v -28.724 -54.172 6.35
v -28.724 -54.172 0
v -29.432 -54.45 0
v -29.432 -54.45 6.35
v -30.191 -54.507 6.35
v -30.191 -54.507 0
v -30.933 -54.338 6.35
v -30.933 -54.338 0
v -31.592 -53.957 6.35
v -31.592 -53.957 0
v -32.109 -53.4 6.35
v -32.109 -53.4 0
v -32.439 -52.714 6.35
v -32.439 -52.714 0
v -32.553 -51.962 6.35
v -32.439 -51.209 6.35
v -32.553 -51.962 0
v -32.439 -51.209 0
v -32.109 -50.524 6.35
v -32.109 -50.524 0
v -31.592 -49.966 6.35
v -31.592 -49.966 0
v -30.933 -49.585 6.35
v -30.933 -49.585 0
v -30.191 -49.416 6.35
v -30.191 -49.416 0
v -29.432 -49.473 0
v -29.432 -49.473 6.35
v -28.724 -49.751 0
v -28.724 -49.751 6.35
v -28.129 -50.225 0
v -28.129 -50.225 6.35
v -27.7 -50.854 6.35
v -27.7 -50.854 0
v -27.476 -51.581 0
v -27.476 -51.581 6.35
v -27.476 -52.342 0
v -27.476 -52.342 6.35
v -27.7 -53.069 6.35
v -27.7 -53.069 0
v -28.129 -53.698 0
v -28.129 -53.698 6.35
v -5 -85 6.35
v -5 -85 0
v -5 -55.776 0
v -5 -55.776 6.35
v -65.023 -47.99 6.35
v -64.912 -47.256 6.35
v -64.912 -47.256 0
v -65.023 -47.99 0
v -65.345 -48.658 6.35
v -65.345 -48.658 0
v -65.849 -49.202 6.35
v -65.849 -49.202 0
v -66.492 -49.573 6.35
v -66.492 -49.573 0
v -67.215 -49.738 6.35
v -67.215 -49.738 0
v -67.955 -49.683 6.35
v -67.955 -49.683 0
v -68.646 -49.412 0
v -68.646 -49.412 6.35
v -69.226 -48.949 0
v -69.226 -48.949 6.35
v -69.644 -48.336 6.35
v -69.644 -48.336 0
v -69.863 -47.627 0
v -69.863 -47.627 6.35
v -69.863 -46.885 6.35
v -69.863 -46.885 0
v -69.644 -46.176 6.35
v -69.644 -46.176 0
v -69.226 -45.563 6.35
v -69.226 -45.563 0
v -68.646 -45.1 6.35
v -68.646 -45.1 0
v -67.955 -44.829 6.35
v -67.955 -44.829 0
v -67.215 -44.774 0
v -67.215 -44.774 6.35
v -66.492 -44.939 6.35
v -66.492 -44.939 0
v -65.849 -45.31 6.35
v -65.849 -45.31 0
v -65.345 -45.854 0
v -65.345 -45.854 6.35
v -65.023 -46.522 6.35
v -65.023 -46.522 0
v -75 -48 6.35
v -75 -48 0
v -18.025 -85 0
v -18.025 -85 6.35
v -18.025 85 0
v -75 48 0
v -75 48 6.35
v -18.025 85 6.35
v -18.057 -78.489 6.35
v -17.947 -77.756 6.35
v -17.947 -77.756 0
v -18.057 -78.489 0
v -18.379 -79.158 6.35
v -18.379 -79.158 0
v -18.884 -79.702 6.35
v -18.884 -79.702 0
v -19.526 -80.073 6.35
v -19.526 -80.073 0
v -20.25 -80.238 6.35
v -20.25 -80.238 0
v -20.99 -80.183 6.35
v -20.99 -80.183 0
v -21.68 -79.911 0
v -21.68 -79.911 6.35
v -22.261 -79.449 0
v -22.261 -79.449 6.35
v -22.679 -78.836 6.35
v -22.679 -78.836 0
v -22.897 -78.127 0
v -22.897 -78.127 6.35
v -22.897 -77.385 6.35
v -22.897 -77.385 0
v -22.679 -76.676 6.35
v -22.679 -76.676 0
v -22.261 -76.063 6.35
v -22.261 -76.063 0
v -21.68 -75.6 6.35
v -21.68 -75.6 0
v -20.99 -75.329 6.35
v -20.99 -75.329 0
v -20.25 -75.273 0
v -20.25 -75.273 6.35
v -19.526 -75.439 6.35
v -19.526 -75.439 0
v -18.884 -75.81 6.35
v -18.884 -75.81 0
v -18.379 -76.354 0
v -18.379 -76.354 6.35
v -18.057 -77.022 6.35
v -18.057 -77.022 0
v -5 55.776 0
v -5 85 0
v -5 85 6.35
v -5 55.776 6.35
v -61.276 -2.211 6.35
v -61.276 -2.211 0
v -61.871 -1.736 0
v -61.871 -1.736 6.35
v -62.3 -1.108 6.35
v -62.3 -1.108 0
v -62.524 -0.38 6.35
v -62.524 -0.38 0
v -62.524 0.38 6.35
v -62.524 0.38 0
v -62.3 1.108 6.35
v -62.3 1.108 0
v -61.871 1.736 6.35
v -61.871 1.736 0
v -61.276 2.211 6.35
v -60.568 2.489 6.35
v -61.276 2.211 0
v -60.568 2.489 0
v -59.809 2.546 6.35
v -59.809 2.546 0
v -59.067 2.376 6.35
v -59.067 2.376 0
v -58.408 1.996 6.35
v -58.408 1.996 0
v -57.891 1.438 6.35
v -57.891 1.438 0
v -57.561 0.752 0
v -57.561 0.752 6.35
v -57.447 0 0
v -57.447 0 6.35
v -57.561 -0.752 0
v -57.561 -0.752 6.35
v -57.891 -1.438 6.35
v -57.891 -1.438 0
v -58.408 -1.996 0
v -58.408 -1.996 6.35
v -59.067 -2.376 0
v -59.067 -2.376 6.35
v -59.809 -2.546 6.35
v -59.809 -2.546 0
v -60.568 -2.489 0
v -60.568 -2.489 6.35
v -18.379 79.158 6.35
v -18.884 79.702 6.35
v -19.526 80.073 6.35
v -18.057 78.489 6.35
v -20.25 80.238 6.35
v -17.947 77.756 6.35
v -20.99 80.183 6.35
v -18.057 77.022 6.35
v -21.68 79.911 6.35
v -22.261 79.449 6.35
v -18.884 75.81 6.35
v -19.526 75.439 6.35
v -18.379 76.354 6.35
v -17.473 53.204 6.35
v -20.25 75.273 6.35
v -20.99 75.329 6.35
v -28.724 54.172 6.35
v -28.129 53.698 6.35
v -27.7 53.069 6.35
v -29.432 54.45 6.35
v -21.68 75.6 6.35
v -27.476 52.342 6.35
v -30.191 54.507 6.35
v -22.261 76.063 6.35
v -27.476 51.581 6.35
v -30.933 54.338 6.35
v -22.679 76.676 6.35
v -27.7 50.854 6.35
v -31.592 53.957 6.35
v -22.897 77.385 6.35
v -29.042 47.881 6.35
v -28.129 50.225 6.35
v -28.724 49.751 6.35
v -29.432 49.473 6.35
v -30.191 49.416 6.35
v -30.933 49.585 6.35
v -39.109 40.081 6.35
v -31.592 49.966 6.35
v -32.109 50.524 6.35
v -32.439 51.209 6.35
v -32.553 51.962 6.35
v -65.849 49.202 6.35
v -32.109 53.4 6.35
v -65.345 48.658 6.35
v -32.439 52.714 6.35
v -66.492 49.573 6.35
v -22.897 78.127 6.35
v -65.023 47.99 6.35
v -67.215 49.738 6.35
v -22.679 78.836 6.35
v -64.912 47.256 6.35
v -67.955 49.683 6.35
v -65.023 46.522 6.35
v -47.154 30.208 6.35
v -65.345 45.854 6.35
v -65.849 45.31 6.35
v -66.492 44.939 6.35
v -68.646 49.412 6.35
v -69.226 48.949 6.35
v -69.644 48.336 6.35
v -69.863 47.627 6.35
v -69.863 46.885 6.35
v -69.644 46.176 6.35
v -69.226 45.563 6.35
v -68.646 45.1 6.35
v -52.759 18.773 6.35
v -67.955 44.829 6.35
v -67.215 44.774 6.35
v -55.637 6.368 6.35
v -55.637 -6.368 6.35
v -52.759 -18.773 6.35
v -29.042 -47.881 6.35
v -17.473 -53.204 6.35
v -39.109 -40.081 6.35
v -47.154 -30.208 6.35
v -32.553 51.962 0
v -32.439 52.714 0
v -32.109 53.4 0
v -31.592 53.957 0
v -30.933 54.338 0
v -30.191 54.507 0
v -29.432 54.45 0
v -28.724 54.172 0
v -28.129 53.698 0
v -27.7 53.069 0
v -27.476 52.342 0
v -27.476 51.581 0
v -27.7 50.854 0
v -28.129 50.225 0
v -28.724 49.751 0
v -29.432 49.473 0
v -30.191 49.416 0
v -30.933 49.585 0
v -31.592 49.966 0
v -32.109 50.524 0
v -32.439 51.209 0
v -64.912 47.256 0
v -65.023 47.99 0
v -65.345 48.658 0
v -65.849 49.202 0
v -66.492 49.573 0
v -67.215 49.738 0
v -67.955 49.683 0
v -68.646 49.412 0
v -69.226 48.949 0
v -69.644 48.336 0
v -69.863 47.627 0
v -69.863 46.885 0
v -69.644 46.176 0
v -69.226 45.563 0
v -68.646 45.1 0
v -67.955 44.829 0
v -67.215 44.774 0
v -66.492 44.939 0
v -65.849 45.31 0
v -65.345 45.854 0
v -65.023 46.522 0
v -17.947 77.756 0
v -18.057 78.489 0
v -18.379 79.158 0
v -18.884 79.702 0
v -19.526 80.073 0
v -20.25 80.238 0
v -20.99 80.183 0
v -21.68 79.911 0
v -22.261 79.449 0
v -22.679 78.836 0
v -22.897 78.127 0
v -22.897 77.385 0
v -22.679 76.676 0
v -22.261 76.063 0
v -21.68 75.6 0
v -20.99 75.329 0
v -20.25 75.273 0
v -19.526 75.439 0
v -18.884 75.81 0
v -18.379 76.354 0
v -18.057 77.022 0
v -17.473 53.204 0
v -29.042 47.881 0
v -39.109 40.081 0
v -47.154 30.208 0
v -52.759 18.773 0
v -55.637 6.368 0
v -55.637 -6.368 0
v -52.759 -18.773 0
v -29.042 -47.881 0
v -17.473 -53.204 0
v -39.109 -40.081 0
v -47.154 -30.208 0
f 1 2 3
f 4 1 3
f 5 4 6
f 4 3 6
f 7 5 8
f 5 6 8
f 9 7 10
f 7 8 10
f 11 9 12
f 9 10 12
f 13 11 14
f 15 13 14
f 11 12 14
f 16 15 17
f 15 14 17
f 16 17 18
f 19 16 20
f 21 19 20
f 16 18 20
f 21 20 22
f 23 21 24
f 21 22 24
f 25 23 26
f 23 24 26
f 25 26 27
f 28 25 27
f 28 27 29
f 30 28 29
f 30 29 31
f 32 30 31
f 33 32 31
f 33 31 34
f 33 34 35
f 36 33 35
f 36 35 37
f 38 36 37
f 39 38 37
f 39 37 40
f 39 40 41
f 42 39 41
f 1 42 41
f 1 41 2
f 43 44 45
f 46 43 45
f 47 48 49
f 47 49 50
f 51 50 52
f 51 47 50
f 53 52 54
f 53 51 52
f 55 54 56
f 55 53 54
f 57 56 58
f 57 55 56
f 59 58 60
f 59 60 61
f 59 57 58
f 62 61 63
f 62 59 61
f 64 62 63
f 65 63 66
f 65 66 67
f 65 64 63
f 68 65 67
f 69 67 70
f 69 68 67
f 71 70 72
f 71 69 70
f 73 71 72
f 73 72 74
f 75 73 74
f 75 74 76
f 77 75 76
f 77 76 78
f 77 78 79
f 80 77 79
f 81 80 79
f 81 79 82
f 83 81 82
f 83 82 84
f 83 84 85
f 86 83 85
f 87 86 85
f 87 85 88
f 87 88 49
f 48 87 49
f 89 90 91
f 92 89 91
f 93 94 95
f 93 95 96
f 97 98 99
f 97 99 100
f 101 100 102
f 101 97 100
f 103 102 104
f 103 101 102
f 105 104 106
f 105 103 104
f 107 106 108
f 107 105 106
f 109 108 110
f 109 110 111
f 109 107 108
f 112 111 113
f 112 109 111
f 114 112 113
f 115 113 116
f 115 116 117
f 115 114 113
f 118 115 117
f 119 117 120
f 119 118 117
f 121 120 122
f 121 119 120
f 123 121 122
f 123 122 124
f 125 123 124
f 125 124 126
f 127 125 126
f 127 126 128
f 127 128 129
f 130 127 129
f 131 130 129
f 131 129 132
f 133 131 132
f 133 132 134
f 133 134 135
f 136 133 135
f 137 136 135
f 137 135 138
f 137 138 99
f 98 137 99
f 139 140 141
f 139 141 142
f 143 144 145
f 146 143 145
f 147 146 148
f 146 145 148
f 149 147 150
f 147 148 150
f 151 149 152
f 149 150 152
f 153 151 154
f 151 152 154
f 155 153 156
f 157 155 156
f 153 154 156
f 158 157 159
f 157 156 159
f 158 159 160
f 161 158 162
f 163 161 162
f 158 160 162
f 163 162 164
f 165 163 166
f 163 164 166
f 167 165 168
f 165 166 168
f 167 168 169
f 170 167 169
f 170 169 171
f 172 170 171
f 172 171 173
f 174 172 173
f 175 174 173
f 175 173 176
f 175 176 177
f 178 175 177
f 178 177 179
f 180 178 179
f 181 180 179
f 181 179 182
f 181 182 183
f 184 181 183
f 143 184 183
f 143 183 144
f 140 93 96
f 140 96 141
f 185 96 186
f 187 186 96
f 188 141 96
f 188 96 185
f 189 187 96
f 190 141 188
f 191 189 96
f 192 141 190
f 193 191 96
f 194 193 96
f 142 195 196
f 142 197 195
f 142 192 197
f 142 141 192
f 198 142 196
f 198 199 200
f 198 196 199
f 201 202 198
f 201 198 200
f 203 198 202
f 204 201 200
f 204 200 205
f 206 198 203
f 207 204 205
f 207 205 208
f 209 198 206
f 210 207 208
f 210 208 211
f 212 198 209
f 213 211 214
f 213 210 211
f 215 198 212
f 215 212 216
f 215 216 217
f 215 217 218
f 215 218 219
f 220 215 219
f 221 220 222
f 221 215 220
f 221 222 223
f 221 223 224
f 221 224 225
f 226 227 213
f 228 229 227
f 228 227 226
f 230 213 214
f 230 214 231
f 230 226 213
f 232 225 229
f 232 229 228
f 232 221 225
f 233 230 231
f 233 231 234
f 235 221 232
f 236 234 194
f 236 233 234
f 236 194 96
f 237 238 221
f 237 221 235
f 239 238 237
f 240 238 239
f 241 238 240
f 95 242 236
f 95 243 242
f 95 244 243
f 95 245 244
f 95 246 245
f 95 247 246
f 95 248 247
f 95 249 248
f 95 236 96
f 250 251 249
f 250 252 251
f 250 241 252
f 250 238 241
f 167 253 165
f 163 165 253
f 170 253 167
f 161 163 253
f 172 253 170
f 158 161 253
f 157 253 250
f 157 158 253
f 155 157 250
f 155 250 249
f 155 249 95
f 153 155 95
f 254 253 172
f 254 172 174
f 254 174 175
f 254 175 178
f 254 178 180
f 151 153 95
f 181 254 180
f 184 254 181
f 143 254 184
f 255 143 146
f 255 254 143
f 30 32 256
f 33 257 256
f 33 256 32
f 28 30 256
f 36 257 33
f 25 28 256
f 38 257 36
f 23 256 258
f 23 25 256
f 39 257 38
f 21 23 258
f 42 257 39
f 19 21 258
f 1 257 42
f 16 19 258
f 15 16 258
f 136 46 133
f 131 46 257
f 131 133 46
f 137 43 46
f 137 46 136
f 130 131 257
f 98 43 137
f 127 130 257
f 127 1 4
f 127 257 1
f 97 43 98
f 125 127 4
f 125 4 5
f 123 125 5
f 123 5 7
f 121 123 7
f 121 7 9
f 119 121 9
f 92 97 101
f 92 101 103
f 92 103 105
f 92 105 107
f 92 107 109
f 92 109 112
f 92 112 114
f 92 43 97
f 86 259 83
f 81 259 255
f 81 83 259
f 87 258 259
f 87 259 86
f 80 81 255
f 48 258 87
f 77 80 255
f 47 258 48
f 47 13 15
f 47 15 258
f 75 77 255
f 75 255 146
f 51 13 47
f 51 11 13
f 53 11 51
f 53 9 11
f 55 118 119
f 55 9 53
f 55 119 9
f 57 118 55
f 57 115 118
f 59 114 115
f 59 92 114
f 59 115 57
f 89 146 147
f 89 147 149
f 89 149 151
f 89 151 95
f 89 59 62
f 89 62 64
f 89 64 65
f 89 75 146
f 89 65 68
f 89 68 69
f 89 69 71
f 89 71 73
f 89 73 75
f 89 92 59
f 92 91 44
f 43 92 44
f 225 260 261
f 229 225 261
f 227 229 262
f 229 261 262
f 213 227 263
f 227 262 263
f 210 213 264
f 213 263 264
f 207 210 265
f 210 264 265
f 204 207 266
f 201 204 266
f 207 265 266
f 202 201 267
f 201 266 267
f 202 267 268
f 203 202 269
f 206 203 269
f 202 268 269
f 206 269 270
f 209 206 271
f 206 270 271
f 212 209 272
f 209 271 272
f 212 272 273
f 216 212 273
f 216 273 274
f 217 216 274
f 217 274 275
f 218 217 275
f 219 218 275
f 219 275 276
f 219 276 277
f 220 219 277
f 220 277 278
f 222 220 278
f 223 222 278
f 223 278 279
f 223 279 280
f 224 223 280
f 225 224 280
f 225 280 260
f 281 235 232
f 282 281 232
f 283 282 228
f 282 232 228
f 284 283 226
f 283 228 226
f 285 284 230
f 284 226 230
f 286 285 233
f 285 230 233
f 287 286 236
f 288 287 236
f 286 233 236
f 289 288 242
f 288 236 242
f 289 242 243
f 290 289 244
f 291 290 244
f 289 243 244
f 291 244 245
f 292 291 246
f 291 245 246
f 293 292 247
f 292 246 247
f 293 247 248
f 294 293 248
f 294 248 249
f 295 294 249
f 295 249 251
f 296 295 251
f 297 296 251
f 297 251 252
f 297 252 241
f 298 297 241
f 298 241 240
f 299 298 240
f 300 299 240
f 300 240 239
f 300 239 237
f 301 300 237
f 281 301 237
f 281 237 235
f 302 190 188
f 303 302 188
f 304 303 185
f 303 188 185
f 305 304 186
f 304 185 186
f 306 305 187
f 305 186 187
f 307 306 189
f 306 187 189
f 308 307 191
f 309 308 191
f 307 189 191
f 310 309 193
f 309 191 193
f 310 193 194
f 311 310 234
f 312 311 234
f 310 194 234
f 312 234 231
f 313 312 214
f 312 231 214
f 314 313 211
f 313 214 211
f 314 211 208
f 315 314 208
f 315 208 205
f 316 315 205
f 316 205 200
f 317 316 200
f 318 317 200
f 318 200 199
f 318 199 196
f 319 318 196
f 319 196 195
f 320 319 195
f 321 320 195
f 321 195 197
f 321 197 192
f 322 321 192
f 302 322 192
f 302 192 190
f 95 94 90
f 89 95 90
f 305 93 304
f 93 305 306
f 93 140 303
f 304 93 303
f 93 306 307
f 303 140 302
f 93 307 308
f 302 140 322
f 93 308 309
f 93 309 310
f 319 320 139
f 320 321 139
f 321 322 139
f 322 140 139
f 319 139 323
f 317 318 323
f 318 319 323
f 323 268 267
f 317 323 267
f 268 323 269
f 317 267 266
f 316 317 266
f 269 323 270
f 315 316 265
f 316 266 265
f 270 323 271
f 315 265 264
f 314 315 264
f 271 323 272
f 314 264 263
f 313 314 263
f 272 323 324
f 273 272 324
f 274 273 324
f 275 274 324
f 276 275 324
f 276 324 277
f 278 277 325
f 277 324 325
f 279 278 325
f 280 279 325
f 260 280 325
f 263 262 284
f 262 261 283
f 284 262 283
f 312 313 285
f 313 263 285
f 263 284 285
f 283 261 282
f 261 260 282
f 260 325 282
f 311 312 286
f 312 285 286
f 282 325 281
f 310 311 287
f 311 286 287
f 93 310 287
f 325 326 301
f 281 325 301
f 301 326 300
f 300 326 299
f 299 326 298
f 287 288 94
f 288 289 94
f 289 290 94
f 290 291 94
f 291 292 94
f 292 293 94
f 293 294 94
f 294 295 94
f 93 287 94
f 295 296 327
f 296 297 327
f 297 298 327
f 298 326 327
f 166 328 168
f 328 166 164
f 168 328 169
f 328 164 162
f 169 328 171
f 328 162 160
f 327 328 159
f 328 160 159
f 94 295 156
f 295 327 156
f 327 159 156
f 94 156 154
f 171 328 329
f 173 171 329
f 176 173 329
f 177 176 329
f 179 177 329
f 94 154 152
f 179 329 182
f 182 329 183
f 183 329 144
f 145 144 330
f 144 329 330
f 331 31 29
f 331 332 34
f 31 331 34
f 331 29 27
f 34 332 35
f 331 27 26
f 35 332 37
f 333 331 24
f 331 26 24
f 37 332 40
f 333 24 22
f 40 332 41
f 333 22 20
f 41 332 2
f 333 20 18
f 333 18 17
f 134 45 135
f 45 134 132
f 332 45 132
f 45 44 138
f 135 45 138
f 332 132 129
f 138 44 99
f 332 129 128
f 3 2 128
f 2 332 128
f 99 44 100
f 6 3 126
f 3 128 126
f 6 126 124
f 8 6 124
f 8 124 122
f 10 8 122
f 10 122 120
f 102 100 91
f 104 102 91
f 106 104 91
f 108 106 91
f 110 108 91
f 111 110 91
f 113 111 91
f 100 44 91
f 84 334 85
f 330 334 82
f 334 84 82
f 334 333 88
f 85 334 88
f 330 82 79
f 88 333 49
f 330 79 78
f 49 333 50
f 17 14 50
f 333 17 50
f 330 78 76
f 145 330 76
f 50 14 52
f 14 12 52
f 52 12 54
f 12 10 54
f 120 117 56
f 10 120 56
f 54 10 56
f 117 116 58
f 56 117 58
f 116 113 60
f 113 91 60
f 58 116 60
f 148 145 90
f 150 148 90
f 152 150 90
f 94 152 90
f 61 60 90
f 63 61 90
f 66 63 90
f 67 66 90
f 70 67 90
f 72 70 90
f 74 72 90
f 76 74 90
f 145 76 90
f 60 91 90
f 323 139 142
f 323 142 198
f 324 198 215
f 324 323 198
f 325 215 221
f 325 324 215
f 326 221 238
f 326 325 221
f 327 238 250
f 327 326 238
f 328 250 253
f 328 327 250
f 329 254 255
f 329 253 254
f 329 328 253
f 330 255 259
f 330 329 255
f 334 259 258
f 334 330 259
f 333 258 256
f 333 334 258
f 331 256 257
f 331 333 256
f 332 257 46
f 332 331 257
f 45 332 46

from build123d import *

# Parameters (mm, degrees)
BOSS_EXTRUDE1_DEPTH        = 6.35
F_10_CLEARANCE_HOLE1_D     = 4.9784
F_10_CLEARANCE_HOLE1_DEPTH = 135.89
F_10_CLEARANCE_HOLE1_TIP   = 1.495662253
SKETCH4_R                  = 56
CUT_EXTRUDE1_DEPTH         = 7.35
F_10_CLEARANCE_HOLE2_D     = 5.1054
CIRPATTERN1_COUNT          = 3
CIRPATTERN1_ANGLE          = 120


with BuildPart() as part:
    # Sketch1 → Boss-Extrude1 (new body)
    with BuildSketch(Plane.XY):
        Polygon((-75, 48), (-18.024996339, 85), (-5, 85), (-5, 0), (-75, 0), align=None)
    extrude(amount=BOSS_EXTRUDE1_DEPTH)

    # #10 Clearance Hole1
    with Locations(Plane(origin=(0, 0, 0), x_dir=(-1, 0, 0), z_dir=(0, 0, -1))):
        with Locations((20.435878863, 77.755724401), (67.401430668, 47.25593844)):
            Hole(F_10_CLEARANCE_HOLE1_D / 2, depth=F_10_CLEARANCE_HOLE1_DEPTH)
            with Locations((0, 0, -(F_10_CLEARANCE_HOLE1_DEPTH + F_10_CLEARANCE_HOLE1_TIP / 2))):  # 118° drill point
                Cone(0, F_10_CLEARANCE_HOLE1_D / 2, F_10_CLEARANCE_HOLE1_TIP, mode=Mode.SUBTRACT)

    # Sketch4 → Cut-Extrude1 (cut, through all)
    with BuildSketch(Plane(origin=(0, 0, 0), x_dir=(-1, 0, 0), z_dir=(0, 0, -1))):
        Circle(SKETCH4_R)
    extrude(amount=-CUT_EXTRUDE1_DEPTH, mode=Mode.SUBTRACT)

    # Mirror1: part across plane


with BuildPart() as part_1:
    add(part.part)
    add(part.part.mirror(Plane.ZX))

    # #10 Clearance Hole2 (through all)
    with Locations(Plane.XY.offset(6.35)):
        with Locations((-30, 51.961524227)):
            f_10_clearance_hole2 = Hole(F_10_CLEARANCE_HOLE2_D / 2)

    # CirPattern1: #10 Clearance Hole2 ×3 about axis
    cirpattern1_axis = Axis((0, 0, 0), (0, 0, 1))
    for i in range(1, CIRPATTERN1_COUNT):
        add(f_10_clearance_hole2.rotate(cirpattern1_axis, i * CIRPATTERN1_ANGLE / (CIRPATTERN1_COUNT - 1)), mode=Mode.SUBTRACT)


solid = part_1.part
